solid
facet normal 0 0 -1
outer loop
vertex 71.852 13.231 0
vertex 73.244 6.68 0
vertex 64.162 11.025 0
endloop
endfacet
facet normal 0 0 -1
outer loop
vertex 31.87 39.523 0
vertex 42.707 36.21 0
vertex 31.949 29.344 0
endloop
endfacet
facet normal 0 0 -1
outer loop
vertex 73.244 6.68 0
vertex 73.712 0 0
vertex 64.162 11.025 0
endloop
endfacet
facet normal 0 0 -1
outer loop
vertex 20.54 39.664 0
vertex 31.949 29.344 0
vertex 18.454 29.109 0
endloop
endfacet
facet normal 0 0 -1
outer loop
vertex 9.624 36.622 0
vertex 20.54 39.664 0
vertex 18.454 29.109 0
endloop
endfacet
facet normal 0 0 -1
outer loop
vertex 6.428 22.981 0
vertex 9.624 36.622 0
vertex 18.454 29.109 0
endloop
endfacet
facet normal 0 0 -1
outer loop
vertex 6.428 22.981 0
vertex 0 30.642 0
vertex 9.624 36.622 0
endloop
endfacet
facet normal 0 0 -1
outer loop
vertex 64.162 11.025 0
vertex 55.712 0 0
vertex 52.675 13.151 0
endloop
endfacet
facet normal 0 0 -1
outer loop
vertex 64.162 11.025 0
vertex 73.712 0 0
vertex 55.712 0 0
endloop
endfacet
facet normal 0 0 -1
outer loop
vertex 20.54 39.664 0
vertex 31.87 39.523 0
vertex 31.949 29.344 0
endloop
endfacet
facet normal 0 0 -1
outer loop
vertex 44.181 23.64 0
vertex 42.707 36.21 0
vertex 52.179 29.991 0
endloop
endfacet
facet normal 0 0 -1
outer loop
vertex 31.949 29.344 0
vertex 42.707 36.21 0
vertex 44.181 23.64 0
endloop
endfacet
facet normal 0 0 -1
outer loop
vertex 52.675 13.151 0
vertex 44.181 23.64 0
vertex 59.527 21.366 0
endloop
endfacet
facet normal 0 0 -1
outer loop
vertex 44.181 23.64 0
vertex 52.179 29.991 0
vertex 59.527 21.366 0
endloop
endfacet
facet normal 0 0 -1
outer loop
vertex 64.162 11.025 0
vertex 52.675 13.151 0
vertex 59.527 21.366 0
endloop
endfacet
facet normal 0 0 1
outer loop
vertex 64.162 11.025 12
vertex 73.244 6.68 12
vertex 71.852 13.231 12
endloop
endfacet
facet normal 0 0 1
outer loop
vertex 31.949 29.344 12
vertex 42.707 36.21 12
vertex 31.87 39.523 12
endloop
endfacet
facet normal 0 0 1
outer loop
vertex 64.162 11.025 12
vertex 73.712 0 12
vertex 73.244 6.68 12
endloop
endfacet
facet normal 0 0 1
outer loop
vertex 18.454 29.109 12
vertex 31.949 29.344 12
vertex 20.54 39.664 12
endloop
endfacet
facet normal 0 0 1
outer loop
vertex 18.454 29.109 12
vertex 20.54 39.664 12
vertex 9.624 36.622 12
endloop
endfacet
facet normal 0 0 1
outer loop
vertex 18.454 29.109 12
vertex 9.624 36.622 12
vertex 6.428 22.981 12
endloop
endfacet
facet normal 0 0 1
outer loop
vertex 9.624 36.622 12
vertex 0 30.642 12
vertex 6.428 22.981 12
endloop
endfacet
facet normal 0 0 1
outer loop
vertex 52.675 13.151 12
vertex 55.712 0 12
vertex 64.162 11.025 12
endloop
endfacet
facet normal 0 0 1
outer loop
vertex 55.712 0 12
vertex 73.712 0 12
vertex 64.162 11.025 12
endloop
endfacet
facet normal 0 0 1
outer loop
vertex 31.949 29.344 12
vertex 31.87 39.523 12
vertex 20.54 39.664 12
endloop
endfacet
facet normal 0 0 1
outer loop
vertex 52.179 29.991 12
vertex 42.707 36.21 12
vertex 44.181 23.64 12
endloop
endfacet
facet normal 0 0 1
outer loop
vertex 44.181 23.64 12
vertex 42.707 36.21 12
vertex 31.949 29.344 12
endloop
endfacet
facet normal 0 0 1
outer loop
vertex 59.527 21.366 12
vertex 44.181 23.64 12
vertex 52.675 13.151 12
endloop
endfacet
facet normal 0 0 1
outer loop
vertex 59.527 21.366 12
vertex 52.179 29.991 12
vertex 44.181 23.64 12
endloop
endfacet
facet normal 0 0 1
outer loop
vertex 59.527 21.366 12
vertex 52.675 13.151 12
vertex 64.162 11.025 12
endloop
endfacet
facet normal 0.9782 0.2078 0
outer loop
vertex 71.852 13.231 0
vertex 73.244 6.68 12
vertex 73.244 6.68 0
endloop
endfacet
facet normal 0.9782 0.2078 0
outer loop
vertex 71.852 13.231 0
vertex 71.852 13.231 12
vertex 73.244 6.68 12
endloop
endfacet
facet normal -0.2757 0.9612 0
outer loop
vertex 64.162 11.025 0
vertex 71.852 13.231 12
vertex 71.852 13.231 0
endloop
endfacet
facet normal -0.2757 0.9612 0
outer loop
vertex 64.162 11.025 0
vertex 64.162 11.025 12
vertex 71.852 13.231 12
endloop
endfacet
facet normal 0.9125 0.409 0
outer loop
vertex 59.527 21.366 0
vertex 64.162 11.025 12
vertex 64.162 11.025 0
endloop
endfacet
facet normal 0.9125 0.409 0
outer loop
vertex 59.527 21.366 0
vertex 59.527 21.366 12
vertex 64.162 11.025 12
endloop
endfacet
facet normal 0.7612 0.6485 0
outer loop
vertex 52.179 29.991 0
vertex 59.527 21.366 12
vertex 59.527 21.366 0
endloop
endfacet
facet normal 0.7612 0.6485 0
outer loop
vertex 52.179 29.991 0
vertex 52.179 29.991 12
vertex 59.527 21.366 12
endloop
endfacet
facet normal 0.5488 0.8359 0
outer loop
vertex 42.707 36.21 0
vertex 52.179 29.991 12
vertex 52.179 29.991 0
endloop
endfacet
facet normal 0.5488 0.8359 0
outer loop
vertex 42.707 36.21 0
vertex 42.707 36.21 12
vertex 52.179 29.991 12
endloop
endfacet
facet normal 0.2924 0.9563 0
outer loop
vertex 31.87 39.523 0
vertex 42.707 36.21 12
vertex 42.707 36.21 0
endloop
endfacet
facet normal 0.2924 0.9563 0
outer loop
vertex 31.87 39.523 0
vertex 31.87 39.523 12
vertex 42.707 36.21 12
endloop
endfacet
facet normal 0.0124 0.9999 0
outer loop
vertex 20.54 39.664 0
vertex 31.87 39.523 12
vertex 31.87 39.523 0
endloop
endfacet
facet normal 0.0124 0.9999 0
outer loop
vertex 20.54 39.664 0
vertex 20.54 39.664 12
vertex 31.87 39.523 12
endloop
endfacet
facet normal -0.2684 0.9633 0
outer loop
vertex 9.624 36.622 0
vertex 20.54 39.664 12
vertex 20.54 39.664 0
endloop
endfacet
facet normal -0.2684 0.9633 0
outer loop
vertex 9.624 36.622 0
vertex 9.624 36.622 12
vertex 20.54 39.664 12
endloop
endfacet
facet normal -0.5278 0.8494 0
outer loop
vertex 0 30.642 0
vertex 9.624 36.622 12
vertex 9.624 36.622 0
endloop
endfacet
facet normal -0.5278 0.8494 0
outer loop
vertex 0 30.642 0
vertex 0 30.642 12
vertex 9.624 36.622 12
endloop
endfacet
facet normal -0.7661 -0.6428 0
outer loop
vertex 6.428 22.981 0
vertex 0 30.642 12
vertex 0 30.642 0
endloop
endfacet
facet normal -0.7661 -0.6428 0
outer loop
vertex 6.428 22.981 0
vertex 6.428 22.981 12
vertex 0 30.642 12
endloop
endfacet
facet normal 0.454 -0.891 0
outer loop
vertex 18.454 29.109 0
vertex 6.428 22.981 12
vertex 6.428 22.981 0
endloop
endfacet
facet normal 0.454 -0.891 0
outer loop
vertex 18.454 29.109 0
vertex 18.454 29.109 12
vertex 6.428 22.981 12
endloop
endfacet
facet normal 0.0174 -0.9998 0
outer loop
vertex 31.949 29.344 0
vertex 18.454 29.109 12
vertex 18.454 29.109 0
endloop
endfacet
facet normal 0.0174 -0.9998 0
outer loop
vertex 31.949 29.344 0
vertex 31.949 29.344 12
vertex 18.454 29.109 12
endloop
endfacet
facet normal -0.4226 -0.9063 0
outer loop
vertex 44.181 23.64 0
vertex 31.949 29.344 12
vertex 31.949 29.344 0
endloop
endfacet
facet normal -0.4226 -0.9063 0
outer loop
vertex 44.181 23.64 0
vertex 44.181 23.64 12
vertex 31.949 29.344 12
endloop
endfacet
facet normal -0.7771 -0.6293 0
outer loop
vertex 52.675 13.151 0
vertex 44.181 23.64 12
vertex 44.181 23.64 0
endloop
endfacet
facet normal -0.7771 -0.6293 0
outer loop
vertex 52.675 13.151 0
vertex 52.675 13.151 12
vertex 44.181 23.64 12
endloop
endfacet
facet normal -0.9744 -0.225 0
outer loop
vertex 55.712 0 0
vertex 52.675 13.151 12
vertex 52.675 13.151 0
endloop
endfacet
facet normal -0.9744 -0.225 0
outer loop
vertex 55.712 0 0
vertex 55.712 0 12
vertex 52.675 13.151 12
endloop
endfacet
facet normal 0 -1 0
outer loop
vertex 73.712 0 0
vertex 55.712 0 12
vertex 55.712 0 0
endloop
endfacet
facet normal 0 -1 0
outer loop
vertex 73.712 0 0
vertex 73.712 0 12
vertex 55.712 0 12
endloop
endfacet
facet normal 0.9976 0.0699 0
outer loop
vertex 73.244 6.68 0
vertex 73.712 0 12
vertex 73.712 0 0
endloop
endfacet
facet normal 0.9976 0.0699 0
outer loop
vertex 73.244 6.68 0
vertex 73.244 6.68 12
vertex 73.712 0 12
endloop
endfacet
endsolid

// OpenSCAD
$fn = 32;

// ----------------------------------------------------------------------
// Arc stop: segment, 12 mm thick
// ----------------------------------------------------------------------

// --- parameters (mm) ---
profile_height = 12;      // extrusion height
profile_points = 17;      // points of the closed outline

profile = [[73.712, 0], [73.244, 6.68], [71.852, 13.231], [64.162, 11.025], [59.527, 21.366], [52.179, 29.991], [42.707, 36.21], [31.87, 39.523], [20.54, 39.664], [9.624, 36.622], [0, 30.642], [6.428, 22.981], [18.454, 29.109], [31.949, 29.344], [44.181, 23.64], [52.675, 13.151], [55.712, 0]];  // single closed polygon, 17 points, counter clockwise

// --- the one profile operation ---
linear_extrude(height = profile_height) polygon(points = profile);
